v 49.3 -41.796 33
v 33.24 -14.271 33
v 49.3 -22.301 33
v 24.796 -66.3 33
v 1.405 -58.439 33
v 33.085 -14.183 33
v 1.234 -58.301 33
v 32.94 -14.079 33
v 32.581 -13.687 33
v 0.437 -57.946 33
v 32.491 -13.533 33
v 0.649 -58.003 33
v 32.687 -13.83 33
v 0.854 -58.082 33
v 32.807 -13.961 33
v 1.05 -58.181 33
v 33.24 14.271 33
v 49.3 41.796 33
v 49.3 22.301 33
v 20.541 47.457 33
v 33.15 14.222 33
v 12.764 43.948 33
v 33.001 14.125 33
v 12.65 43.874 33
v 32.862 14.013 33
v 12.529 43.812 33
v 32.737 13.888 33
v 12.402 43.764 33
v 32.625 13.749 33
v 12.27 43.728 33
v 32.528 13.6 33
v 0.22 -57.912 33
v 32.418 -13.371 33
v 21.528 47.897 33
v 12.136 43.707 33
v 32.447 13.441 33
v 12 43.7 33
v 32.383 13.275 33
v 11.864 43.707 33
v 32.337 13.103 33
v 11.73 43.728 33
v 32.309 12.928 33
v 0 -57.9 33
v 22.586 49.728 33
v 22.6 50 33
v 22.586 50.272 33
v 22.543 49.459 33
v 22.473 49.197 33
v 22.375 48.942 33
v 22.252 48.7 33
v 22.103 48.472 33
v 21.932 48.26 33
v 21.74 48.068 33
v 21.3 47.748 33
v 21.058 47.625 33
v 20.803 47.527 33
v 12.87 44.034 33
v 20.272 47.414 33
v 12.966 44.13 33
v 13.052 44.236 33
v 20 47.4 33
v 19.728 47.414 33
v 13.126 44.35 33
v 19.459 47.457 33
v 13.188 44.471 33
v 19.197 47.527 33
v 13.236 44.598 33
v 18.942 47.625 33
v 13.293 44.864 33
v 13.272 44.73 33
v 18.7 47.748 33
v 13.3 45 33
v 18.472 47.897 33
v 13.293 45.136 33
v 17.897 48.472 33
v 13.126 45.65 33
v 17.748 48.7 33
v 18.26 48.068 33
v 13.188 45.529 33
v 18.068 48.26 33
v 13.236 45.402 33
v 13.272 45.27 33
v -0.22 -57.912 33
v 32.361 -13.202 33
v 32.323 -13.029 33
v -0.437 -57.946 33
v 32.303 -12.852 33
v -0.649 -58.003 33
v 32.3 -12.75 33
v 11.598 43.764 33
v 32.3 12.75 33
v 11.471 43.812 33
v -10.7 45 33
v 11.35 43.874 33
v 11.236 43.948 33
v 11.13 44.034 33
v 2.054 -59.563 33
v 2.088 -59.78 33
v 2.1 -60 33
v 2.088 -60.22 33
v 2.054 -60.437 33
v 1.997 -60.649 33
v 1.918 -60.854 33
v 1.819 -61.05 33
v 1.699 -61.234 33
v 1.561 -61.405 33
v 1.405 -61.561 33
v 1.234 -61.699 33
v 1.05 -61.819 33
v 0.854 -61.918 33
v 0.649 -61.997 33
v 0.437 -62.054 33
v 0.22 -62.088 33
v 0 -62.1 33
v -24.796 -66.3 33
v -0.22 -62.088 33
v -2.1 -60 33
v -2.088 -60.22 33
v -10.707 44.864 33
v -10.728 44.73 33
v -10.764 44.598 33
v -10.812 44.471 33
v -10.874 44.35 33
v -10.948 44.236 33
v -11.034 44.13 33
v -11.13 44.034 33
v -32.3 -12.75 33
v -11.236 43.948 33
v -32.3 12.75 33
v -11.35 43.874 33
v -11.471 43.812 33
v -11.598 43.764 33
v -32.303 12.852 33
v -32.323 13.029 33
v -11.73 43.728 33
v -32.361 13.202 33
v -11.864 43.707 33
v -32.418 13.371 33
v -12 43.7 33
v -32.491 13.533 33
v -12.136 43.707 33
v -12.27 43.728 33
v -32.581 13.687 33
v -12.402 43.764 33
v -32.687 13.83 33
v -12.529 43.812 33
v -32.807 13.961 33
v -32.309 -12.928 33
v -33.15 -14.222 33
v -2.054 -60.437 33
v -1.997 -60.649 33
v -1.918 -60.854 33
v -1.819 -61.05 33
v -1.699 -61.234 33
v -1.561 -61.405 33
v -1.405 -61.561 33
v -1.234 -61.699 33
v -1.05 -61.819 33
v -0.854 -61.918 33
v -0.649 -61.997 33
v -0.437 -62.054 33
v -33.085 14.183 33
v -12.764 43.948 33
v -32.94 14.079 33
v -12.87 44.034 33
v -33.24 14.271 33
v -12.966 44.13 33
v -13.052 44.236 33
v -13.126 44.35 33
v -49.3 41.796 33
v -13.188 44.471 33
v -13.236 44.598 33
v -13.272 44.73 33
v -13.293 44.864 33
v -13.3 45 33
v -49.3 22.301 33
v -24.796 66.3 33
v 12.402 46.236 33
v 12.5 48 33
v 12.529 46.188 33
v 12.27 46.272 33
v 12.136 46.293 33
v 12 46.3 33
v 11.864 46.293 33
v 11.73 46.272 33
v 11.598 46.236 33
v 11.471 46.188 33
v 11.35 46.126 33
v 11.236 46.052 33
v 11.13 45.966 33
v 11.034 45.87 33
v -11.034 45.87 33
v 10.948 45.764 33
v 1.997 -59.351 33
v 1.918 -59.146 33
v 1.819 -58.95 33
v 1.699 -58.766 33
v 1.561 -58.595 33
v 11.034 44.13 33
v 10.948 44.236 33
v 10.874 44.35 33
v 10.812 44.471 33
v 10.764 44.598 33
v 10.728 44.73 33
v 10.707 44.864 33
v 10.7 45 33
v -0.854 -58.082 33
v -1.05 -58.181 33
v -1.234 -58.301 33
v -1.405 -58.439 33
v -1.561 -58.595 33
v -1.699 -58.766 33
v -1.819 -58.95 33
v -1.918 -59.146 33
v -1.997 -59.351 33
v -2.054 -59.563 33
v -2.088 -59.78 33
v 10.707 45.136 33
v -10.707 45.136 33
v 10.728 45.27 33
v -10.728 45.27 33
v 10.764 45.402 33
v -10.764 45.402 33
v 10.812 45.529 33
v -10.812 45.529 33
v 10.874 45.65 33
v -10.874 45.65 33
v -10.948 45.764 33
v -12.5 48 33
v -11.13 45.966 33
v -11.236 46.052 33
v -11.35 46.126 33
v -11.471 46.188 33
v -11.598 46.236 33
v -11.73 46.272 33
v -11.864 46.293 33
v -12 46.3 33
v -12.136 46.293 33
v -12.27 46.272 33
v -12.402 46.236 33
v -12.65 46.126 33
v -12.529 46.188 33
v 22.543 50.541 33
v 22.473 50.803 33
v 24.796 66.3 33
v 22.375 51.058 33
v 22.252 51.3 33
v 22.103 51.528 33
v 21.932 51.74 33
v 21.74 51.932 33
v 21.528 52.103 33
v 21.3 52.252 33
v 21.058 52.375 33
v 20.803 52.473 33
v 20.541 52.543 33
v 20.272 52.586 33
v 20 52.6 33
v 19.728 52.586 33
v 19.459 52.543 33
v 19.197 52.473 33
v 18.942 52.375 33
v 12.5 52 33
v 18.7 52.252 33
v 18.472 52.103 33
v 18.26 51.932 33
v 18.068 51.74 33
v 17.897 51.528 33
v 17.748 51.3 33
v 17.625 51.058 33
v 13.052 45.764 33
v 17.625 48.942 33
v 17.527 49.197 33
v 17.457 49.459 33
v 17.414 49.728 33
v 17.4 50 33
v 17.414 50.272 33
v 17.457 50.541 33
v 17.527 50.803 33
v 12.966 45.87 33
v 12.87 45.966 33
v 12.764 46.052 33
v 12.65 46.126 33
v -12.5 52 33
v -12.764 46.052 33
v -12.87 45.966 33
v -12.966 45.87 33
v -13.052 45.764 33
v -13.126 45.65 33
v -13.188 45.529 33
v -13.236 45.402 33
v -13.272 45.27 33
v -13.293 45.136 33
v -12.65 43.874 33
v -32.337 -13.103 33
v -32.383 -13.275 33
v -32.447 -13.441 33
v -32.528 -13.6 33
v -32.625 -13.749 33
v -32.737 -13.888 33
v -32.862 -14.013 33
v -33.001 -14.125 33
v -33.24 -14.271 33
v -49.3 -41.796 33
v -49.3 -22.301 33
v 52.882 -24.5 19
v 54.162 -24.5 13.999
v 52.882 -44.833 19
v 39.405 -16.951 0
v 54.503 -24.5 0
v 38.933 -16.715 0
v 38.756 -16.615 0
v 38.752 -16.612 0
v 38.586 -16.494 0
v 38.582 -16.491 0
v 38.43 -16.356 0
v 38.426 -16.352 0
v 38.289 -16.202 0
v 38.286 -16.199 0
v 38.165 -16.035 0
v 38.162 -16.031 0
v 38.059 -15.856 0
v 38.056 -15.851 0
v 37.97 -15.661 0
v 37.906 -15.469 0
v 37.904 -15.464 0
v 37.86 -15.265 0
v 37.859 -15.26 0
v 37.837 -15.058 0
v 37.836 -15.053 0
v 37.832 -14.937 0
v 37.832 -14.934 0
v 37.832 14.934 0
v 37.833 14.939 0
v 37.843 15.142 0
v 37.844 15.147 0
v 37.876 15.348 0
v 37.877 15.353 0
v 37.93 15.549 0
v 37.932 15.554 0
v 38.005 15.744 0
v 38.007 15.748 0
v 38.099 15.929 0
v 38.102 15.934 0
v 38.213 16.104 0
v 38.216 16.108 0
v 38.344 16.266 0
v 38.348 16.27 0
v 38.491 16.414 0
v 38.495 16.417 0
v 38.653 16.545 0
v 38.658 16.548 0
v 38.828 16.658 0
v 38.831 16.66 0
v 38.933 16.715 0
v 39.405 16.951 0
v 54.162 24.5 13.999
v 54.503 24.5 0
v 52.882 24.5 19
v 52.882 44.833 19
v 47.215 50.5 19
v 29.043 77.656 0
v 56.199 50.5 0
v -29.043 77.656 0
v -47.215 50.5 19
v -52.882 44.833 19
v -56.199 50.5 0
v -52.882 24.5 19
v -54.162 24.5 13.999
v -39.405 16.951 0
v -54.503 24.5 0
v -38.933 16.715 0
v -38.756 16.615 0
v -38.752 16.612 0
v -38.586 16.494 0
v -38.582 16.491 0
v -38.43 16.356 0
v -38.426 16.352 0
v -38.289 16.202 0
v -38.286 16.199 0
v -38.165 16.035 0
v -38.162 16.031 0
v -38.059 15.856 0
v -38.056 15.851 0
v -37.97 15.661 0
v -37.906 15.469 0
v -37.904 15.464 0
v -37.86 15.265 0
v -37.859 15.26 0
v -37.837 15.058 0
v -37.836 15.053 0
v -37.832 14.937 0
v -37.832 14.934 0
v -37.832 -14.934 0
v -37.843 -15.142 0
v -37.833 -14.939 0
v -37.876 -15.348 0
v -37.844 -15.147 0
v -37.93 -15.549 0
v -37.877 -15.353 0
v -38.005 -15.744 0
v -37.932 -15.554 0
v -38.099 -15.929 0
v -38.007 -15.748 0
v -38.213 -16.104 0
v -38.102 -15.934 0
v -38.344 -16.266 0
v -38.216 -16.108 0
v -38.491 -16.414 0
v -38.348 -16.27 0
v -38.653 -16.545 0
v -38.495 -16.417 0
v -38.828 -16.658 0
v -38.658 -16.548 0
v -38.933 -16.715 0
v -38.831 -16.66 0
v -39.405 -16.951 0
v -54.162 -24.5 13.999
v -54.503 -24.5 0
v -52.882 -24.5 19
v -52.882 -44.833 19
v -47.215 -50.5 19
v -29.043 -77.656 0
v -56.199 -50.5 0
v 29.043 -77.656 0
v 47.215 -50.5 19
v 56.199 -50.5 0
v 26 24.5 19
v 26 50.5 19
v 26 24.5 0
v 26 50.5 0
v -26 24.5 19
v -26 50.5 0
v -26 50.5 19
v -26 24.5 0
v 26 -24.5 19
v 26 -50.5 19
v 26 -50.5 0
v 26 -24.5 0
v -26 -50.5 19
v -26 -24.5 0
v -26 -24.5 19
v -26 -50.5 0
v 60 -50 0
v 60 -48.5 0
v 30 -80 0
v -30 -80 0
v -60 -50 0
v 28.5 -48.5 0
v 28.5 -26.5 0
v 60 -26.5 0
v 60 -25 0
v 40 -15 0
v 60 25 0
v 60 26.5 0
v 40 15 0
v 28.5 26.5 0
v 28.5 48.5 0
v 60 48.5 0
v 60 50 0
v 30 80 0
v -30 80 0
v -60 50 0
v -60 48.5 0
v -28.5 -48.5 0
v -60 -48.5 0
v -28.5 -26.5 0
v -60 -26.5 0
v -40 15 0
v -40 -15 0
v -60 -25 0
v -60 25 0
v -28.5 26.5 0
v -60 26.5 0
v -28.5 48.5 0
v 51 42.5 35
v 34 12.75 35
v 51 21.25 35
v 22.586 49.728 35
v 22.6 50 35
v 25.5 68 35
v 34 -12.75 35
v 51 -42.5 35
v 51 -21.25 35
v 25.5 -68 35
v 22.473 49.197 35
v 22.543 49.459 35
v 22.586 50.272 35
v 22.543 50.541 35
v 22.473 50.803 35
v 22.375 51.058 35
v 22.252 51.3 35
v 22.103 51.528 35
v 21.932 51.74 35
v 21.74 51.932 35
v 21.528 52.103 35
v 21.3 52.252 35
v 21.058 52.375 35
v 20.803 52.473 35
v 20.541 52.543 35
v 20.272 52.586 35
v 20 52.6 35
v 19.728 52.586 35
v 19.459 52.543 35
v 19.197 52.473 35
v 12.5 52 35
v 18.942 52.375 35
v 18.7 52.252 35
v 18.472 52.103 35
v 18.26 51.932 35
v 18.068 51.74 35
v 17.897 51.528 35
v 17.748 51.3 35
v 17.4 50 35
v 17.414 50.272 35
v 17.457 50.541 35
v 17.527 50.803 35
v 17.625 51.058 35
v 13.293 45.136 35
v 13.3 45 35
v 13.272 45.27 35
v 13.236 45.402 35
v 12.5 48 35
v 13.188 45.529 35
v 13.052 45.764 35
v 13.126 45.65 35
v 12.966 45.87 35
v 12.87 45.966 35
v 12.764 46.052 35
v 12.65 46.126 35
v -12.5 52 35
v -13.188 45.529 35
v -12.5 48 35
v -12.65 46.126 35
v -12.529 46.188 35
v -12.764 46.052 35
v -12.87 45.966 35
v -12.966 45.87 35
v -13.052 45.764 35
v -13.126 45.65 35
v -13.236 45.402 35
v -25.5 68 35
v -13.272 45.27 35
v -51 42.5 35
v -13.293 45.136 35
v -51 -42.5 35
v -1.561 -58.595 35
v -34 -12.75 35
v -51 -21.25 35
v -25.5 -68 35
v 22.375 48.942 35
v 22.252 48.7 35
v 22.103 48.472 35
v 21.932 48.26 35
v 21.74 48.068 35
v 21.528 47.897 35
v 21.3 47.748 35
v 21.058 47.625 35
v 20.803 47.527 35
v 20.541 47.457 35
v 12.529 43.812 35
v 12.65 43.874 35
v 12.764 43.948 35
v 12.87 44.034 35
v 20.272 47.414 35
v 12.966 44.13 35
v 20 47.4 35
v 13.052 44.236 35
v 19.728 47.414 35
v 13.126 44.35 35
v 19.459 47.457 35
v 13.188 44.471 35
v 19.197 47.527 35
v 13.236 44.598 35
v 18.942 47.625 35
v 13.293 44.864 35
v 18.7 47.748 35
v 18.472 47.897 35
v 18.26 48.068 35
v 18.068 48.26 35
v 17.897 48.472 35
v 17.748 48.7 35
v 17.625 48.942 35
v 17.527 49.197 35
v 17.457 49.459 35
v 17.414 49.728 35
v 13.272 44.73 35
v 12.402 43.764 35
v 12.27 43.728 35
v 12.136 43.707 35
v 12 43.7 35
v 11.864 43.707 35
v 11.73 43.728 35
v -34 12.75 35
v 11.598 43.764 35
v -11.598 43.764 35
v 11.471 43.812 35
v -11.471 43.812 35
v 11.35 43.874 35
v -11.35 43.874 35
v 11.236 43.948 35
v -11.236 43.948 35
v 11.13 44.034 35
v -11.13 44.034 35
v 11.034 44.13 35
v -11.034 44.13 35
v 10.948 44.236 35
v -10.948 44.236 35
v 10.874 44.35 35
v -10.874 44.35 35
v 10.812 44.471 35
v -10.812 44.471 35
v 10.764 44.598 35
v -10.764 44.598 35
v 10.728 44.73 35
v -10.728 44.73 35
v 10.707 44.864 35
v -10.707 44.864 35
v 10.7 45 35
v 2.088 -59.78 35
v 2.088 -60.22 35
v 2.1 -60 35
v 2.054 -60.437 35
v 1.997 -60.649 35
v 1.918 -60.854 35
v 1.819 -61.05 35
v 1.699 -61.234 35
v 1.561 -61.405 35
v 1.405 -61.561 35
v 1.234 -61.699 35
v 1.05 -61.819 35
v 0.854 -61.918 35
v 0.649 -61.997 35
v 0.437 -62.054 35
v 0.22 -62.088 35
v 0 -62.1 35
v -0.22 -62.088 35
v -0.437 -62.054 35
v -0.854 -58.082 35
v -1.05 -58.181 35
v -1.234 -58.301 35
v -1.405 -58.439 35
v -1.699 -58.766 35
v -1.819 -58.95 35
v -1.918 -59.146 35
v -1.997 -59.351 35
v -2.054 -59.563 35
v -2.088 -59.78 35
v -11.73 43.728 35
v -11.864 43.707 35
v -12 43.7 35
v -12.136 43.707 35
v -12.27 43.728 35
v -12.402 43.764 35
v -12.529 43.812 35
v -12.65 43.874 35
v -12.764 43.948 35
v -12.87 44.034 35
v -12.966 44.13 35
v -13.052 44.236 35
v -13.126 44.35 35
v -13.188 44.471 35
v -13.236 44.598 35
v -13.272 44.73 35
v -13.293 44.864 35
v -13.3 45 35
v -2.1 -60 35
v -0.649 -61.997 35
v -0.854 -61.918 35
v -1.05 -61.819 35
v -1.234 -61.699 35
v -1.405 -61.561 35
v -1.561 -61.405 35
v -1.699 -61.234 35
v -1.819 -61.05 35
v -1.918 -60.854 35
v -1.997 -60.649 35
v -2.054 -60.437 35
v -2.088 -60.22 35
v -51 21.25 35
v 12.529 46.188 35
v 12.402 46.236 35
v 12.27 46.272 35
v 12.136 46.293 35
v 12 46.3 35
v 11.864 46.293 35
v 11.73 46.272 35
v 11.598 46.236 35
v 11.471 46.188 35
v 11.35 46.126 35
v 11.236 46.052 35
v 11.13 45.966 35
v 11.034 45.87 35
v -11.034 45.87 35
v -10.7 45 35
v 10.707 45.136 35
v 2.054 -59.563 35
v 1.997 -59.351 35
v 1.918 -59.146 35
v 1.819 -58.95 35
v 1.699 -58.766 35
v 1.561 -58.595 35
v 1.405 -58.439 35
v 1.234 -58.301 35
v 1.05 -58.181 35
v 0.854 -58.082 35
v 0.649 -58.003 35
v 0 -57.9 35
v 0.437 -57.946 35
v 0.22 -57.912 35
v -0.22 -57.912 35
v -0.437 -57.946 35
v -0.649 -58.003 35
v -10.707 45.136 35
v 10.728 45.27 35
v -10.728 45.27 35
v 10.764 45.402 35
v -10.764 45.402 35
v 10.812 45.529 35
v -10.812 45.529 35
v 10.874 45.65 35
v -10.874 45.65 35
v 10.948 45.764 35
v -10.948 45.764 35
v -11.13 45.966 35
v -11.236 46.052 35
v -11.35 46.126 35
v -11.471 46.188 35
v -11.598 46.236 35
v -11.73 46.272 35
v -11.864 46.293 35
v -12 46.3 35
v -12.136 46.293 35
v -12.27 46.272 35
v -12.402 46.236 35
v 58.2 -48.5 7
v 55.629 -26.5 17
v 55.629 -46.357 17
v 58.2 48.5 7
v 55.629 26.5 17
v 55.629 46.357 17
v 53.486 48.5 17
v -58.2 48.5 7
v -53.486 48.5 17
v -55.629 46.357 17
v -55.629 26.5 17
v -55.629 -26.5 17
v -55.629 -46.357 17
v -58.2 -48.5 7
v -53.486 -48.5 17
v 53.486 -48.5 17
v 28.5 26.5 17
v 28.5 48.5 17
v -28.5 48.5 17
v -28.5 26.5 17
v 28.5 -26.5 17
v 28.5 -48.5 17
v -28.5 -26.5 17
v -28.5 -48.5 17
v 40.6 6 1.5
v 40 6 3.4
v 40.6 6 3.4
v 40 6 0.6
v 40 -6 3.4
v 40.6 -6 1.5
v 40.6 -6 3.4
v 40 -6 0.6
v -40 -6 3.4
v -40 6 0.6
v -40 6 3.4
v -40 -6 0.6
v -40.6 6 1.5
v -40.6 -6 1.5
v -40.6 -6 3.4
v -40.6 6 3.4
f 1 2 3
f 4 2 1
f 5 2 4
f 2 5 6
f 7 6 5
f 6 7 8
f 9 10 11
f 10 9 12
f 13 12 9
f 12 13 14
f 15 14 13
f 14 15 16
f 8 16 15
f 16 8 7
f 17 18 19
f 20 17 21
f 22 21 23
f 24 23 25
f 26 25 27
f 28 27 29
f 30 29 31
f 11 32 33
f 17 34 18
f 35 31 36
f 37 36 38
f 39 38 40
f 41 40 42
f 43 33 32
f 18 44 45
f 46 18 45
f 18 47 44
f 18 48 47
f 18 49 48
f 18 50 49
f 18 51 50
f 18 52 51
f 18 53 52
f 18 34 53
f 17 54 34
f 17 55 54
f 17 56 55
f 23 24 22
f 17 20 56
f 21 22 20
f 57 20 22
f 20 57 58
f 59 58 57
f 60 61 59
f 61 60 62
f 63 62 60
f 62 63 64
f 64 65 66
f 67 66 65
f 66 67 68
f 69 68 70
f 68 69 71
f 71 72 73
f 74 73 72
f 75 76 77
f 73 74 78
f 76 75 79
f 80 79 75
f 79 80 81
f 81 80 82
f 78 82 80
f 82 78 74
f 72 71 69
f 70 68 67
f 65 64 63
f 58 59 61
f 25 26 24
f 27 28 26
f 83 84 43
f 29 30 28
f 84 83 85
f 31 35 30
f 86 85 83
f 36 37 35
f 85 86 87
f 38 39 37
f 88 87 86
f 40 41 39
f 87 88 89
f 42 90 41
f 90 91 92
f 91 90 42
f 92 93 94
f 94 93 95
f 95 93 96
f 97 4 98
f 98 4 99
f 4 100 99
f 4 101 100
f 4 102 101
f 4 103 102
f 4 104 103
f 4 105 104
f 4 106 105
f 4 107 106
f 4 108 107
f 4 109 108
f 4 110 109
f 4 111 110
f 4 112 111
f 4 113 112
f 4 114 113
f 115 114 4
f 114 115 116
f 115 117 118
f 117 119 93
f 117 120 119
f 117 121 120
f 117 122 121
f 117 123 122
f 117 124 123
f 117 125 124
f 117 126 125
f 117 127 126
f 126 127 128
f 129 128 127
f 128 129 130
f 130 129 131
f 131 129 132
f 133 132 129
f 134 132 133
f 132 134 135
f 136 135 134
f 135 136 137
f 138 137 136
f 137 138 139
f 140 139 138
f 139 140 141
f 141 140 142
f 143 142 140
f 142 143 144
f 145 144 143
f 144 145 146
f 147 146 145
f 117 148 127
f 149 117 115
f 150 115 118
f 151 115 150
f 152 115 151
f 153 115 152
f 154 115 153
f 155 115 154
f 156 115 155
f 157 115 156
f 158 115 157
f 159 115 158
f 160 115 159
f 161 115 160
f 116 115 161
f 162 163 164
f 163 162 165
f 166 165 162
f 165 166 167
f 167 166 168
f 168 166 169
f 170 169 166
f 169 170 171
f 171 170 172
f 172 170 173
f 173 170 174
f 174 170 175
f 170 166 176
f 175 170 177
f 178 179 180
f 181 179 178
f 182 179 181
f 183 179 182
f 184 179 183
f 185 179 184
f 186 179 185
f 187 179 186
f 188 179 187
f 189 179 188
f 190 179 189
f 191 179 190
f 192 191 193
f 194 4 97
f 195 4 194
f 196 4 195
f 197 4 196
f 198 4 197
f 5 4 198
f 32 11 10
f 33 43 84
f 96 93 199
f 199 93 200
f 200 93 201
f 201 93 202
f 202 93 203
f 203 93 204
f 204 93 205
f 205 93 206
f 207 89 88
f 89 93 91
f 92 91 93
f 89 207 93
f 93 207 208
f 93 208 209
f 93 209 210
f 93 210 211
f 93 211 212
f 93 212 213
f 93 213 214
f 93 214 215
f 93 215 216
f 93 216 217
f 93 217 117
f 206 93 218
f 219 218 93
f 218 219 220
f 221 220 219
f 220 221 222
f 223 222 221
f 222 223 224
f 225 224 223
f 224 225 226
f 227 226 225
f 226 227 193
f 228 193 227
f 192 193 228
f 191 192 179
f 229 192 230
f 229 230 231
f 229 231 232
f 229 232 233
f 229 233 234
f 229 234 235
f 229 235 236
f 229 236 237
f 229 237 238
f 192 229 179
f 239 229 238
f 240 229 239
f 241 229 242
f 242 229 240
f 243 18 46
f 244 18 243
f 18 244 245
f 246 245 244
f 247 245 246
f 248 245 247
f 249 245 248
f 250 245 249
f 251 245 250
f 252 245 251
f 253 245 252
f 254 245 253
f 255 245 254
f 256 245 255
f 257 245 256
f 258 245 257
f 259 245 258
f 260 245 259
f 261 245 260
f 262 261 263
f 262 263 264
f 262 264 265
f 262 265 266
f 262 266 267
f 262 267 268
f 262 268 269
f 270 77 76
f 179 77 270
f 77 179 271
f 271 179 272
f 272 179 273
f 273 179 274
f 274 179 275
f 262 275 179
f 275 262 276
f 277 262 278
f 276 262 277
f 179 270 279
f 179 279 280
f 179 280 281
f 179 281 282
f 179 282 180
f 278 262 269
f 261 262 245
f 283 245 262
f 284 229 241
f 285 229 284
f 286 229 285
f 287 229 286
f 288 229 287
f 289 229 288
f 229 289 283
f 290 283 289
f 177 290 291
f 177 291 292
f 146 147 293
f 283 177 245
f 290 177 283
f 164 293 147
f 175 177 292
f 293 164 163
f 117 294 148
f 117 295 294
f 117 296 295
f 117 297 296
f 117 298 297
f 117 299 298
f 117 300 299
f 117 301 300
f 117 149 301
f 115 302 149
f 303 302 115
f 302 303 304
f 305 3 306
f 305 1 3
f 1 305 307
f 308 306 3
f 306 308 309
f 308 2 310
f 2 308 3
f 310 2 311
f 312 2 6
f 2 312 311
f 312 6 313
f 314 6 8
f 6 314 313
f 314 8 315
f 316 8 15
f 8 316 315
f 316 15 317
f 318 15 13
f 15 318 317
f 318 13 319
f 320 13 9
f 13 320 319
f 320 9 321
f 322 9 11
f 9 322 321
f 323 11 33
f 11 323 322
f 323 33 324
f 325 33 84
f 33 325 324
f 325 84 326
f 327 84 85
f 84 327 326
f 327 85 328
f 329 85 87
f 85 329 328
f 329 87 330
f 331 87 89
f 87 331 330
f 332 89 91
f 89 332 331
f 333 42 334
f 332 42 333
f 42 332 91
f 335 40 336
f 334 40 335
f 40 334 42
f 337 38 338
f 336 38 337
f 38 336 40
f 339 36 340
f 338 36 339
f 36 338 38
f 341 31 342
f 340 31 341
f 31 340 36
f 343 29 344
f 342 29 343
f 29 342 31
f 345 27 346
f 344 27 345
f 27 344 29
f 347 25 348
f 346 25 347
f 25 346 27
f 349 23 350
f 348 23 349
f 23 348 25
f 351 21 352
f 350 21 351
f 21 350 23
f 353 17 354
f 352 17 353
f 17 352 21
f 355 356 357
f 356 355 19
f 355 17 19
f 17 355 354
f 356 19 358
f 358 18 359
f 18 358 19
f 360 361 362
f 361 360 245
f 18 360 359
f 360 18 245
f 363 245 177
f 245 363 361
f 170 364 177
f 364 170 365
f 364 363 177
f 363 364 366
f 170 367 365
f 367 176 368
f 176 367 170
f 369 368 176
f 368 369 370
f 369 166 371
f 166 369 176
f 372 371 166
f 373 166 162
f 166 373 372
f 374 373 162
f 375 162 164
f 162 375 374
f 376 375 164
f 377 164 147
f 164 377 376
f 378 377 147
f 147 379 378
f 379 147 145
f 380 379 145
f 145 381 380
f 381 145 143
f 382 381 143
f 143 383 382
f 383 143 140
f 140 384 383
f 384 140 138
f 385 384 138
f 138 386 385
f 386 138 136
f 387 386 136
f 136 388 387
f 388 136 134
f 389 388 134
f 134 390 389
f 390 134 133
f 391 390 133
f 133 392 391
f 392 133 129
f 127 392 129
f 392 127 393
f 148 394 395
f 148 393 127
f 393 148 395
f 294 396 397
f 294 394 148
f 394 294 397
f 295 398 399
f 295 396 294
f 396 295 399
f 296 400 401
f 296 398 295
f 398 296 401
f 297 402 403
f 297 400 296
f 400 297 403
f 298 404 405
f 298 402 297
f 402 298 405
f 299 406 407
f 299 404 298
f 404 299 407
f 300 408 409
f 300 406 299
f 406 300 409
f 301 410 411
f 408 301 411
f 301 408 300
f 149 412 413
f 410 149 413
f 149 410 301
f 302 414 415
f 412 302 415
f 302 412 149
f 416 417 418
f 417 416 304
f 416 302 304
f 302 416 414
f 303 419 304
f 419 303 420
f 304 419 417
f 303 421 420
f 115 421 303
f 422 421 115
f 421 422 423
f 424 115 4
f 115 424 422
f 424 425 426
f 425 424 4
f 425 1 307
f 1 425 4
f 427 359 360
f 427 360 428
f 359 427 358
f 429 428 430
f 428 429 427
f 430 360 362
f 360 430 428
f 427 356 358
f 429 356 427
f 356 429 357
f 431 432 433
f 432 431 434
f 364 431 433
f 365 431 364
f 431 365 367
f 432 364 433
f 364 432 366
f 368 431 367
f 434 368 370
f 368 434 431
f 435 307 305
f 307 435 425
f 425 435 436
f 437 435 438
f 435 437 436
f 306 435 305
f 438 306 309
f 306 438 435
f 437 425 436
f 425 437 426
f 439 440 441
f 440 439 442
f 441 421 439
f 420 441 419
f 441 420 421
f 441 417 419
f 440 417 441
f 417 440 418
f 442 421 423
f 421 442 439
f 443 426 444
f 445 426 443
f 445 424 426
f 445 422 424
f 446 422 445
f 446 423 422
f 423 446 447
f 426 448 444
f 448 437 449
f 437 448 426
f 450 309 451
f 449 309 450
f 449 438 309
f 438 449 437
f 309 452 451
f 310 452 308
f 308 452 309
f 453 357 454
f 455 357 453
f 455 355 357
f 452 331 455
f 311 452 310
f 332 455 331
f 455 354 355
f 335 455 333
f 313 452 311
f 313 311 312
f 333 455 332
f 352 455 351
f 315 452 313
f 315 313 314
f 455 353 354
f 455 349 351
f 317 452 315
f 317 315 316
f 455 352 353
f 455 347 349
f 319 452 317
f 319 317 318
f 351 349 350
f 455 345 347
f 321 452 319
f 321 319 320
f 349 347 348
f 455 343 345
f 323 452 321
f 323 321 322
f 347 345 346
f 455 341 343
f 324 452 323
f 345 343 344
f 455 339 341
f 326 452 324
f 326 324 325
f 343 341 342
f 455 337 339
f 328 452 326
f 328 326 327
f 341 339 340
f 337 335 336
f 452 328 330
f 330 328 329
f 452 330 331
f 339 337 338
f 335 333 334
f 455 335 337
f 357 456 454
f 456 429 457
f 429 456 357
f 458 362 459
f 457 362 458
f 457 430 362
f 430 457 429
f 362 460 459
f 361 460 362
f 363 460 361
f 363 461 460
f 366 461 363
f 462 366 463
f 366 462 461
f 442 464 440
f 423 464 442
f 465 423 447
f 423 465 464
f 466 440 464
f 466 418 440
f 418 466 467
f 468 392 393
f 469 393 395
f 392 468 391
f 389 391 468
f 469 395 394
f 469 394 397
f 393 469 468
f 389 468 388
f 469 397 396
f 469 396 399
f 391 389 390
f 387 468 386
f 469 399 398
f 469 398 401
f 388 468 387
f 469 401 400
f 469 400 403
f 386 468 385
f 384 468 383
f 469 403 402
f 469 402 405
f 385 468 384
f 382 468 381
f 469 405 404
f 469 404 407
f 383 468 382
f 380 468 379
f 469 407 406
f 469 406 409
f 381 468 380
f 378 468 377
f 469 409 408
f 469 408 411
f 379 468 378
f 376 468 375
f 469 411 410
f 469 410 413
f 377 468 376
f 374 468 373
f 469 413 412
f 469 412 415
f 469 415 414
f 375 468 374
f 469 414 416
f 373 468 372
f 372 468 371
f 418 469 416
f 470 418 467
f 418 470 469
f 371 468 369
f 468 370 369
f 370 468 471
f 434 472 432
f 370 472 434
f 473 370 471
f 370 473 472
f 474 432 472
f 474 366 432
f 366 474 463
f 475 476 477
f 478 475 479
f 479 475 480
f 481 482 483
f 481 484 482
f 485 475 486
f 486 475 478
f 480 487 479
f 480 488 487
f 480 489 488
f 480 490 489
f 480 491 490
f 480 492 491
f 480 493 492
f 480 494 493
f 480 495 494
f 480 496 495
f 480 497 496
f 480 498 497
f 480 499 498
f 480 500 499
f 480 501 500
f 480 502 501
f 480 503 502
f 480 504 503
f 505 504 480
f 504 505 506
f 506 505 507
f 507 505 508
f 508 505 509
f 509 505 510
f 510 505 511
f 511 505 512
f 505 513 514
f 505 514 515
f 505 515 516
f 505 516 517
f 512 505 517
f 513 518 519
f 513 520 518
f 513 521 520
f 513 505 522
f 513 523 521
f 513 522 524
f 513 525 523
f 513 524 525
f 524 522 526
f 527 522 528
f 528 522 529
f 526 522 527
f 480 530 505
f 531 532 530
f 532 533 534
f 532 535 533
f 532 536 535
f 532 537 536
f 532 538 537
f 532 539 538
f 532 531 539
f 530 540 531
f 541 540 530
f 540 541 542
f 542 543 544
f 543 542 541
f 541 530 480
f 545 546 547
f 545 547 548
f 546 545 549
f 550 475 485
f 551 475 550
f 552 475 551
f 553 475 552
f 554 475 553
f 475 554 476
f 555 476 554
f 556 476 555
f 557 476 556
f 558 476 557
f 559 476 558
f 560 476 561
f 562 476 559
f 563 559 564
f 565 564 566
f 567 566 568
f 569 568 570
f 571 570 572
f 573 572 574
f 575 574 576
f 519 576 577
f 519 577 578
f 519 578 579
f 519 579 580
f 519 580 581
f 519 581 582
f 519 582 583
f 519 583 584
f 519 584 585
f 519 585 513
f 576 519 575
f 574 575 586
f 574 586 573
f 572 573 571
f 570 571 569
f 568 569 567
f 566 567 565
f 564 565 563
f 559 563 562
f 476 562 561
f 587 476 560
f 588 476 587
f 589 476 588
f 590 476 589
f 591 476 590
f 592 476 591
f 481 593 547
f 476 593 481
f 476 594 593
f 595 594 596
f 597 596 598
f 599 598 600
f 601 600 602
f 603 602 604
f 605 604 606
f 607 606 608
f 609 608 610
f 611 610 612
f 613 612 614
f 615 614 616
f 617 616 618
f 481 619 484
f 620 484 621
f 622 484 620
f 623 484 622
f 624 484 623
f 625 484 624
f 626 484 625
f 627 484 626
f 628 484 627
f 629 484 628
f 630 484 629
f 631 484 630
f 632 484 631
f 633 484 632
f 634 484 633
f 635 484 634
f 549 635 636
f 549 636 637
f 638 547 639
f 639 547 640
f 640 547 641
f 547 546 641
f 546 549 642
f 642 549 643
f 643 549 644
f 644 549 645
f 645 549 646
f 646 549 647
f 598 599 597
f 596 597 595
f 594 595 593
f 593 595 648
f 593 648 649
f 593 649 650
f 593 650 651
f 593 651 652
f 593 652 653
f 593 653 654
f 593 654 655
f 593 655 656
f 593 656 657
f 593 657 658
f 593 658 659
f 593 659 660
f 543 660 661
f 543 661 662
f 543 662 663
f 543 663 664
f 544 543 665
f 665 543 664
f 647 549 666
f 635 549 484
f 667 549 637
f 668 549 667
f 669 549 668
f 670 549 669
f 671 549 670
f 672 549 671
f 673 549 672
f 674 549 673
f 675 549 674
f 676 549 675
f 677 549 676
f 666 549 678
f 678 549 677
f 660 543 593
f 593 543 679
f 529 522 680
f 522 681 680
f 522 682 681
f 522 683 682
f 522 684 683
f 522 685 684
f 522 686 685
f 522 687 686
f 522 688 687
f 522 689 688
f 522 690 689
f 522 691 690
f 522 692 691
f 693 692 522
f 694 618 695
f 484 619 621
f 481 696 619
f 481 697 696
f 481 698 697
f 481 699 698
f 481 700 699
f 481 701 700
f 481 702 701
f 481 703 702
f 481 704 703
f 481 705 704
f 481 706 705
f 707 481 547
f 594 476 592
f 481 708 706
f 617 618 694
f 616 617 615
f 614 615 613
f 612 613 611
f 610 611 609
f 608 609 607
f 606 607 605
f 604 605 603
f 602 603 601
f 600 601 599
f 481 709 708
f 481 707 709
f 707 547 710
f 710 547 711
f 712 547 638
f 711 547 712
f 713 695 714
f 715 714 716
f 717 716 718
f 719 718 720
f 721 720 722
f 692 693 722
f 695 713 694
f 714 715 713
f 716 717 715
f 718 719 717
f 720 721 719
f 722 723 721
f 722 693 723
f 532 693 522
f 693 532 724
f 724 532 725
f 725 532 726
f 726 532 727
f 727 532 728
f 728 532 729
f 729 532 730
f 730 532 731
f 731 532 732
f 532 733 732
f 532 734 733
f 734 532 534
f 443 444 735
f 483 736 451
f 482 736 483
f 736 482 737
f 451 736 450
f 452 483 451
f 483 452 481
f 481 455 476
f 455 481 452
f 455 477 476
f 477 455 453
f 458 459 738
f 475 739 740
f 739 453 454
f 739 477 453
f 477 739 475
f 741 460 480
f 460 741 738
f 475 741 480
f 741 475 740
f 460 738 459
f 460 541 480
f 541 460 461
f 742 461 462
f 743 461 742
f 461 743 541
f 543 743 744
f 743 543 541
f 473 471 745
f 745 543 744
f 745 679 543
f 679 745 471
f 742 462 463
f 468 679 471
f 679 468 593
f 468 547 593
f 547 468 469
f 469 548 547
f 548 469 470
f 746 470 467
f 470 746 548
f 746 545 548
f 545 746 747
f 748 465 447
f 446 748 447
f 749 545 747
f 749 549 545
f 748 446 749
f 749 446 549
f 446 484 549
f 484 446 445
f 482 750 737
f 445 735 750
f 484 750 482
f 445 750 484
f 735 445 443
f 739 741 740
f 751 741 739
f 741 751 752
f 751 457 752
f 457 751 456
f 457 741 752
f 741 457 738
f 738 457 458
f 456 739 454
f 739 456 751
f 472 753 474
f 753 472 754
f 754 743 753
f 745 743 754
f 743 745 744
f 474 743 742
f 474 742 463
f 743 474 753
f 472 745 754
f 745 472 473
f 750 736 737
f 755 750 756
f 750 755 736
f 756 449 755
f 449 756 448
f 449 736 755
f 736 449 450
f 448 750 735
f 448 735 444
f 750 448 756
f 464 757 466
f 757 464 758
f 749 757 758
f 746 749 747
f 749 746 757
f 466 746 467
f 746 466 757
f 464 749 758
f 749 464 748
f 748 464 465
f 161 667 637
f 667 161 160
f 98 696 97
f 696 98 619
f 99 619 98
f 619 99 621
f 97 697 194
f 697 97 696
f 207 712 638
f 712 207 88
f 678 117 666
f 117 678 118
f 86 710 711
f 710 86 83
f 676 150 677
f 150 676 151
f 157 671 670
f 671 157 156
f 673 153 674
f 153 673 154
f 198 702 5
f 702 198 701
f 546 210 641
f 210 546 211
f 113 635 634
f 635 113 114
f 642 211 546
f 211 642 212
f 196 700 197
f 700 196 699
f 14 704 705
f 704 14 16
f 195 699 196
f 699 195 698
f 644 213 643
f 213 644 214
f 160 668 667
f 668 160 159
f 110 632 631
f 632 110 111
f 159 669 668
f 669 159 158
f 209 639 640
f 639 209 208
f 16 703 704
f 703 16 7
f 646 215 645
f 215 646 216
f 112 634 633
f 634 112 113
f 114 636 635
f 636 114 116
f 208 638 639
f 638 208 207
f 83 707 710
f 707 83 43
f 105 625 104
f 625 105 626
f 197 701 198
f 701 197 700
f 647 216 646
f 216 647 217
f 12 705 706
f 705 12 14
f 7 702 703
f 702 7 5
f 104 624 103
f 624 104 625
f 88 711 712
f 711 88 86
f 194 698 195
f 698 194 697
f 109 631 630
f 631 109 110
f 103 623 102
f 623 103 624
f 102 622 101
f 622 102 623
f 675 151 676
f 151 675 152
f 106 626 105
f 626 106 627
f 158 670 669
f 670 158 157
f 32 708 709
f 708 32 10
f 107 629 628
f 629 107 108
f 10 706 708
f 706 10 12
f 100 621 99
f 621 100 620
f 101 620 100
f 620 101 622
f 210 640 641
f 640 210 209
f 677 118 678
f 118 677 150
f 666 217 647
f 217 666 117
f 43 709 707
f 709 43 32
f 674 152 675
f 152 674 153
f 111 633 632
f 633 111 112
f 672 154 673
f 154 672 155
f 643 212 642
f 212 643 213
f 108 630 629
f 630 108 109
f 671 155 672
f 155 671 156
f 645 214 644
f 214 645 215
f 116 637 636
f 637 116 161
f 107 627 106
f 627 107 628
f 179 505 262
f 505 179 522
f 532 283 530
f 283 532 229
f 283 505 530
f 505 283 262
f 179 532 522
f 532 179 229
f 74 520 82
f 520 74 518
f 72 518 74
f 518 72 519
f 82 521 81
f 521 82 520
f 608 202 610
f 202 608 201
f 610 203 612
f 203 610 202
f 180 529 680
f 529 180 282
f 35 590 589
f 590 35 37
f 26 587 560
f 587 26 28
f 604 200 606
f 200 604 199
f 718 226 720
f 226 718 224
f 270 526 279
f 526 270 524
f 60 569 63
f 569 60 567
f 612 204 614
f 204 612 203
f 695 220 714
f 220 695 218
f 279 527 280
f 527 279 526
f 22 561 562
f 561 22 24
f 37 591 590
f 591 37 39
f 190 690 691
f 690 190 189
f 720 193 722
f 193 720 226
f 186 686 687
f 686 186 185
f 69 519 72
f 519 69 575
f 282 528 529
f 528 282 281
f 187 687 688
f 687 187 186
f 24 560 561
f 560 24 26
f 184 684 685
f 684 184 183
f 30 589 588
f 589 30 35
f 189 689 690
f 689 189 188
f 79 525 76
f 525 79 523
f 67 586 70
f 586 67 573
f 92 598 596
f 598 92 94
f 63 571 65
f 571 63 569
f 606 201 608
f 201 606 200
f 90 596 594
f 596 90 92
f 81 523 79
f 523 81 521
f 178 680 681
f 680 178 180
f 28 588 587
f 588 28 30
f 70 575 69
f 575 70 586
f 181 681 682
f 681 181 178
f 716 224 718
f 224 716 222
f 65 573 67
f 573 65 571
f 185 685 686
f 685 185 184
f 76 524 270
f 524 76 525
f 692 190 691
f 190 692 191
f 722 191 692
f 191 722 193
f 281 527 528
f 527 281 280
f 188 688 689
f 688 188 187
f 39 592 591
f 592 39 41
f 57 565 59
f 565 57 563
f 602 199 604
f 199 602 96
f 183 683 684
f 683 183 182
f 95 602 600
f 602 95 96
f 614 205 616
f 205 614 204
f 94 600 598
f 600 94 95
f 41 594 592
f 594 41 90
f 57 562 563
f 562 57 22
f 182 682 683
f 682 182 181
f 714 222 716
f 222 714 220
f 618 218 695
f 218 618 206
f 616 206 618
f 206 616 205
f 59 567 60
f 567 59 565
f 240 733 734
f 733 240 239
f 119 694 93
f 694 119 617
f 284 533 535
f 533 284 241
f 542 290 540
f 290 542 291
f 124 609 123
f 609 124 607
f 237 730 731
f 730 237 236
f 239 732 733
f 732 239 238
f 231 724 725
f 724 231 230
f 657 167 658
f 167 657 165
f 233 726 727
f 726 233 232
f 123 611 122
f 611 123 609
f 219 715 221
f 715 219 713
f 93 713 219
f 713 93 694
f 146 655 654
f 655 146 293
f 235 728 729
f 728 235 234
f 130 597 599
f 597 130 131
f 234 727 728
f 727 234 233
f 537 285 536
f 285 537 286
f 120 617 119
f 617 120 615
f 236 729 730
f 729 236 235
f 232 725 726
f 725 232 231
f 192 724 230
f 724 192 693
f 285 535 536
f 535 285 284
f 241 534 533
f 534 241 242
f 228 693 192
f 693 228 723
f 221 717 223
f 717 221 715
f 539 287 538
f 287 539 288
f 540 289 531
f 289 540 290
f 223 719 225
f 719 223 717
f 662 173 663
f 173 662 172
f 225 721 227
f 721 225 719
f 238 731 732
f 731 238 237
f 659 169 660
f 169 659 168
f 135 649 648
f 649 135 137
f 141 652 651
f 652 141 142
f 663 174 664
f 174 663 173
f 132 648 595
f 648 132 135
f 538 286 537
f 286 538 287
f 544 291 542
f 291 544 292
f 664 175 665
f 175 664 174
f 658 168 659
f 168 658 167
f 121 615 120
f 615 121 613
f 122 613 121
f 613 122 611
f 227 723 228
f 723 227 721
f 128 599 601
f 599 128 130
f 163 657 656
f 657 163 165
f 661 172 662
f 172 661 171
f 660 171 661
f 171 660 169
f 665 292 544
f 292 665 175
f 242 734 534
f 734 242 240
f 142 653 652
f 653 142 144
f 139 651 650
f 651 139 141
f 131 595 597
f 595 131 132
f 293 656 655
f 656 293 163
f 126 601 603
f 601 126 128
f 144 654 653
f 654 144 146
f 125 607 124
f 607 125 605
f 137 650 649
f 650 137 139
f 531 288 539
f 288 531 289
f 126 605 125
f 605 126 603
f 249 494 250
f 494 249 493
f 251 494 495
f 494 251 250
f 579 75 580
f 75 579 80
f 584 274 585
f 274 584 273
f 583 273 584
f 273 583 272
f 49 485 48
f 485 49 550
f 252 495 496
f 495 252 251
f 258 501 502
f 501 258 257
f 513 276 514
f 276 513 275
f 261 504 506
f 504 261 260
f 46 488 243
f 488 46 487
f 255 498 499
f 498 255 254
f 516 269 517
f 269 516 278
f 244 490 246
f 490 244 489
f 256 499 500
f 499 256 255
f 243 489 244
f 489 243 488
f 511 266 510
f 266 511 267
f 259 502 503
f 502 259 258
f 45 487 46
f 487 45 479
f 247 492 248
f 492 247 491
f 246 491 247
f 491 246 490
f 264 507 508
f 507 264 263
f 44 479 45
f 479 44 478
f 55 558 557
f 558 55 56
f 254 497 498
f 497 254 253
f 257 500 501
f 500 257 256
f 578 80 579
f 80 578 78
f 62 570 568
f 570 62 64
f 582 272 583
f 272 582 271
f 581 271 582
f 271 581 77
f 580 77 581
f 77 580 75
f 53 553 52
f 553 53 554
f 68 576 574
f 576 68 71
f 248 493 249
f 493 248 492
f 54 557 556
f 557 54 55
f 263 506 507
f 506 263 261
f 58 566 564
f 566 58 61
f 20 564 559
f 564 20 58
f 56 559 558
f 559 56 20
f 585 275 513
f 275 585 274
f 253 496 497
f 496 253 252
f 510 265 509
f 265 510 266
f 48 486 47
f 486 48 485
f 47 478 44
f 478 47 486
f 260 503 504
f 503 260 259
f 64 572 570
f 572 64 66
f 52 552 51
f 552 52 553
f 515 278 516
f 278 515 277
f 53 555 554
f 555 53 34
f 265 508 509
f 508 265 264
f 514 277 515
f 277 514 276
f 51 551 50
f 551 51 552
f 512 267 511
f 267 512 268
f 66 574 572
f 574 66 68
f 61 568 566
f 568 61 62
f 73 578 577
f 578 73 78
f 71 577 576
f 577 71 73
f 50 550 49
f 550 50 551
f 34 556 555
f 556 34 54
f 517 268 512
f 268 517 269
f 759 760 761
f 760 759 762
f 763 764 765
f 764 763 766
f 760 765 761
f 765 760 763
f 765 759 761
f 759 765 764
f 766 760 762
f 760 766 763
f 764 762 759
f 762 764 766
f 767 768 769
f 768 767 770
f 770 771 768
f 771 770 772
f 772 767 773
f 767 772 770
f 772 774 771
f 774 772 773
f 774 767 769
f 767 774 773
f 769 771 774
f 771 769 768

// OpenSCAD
$fn = 60;

vaz_hossz = 160;            
vaz_szelesseg_veg = 120;    
vaz_szelesseg_kozep = 80;
burkolat_magassag = 35;     
fal_vastagsag = 2;

module alap_kontur_2d() {
    polygon(points=[
        [30,  80], [60,  50], [60,  25], [40,  15], 
        [40, -15], [60, -25], [60, -50], [30, -80], 
        [-30, -80], [-60, -50], [-60, -25], [-40, -15], 
        [-40,  15], [-60,  25], [-60,  50], [-30,  80]
    ]);
}

module tomor_test() {
    
    linear_extrude(height = burkolat_magassag, scale = 0.85) {
        alap_kontur_2d();
    }
}

module ureges_burkolat_hej() {
    difference() {
        tomor_test();
        
        difference() {
            translate([0, 0, -1])
            linear_extrude(height = burkolat_magassag - fal_vastagsag + 1, scale = 0.85) {
                offset(r = -fal_vastagsag) { 
                    alap_kontur_2d(); 
                }
            }

            translate([46, 37.5, 8]) cube([40, 26, 22], center=true);
            translate([-46, 37.5, 8]) cube([40, 26, 22], center=true);
            translate([46, -37.5, 8]) cube([40, 26, 22], center=true);
            translate([-46, -37.5, 8]) cube([40, 26, 22], center=true);
        }
    }
}
module pattintos_fulek() {
    
    translate([40, 0, 0])
        rotate([90, 0, 0])
        linear_extrude(height=12, center=true) {
            
            polygon([[0, 0.6], [0.6, 1.5], [0.6, 3.4], [0, 3.4]]);
        }
        
    translate([-40, 0, 0])
        rotate([90, 0, 0])
        linear_extrude(height=12, center=true) {
            polygon([[0, 0.6], [-0.6, 1.5], [-0.6, 3.4], [0, 3.4]]);
        }
}

union() {
    difference() {
        ureges_burkolat_hej();
        
        // Kerekek helyének kivágása
        translate([46, 37.5, 8]) cube([35, 22, 18], center=true);
        translate([-46, 37.5, 8]) cube([35, 22, 18], center=true);
        translate([46, -37.5, 8]) cube([35, 22, 18], center=true);
        translate([-46, -37.5, 8]) cube([35, 22, 18], center=true);
            
        // Zászlótartó lyuk
        translate([0, -60, burkolat_magassag - 5]) 
            cylinder(d=4.2, h=10, center=true);
            
        // Kamera kábelének kivezetése
        translate([0, 50, burkolat_magassag - 5]) 
            cube([25, 4, 10], center=true);
        
        // Kamera rögzítőfuratok
            translate([12, 45, burkolat_magassag - 5]) cylinder(d=2.6, h=12, center=true);
            translate([-12, 45, burkolat_magassag - 5]) cylinder(d=2.6, h=12, center=true);
            
        // Infra LED furat
        translate([20, 50, burkolat_magassag - 5]) 
            cylinder(d=5.2, h=10, center=true);
    }
    
    pattintos_fulek();
}
